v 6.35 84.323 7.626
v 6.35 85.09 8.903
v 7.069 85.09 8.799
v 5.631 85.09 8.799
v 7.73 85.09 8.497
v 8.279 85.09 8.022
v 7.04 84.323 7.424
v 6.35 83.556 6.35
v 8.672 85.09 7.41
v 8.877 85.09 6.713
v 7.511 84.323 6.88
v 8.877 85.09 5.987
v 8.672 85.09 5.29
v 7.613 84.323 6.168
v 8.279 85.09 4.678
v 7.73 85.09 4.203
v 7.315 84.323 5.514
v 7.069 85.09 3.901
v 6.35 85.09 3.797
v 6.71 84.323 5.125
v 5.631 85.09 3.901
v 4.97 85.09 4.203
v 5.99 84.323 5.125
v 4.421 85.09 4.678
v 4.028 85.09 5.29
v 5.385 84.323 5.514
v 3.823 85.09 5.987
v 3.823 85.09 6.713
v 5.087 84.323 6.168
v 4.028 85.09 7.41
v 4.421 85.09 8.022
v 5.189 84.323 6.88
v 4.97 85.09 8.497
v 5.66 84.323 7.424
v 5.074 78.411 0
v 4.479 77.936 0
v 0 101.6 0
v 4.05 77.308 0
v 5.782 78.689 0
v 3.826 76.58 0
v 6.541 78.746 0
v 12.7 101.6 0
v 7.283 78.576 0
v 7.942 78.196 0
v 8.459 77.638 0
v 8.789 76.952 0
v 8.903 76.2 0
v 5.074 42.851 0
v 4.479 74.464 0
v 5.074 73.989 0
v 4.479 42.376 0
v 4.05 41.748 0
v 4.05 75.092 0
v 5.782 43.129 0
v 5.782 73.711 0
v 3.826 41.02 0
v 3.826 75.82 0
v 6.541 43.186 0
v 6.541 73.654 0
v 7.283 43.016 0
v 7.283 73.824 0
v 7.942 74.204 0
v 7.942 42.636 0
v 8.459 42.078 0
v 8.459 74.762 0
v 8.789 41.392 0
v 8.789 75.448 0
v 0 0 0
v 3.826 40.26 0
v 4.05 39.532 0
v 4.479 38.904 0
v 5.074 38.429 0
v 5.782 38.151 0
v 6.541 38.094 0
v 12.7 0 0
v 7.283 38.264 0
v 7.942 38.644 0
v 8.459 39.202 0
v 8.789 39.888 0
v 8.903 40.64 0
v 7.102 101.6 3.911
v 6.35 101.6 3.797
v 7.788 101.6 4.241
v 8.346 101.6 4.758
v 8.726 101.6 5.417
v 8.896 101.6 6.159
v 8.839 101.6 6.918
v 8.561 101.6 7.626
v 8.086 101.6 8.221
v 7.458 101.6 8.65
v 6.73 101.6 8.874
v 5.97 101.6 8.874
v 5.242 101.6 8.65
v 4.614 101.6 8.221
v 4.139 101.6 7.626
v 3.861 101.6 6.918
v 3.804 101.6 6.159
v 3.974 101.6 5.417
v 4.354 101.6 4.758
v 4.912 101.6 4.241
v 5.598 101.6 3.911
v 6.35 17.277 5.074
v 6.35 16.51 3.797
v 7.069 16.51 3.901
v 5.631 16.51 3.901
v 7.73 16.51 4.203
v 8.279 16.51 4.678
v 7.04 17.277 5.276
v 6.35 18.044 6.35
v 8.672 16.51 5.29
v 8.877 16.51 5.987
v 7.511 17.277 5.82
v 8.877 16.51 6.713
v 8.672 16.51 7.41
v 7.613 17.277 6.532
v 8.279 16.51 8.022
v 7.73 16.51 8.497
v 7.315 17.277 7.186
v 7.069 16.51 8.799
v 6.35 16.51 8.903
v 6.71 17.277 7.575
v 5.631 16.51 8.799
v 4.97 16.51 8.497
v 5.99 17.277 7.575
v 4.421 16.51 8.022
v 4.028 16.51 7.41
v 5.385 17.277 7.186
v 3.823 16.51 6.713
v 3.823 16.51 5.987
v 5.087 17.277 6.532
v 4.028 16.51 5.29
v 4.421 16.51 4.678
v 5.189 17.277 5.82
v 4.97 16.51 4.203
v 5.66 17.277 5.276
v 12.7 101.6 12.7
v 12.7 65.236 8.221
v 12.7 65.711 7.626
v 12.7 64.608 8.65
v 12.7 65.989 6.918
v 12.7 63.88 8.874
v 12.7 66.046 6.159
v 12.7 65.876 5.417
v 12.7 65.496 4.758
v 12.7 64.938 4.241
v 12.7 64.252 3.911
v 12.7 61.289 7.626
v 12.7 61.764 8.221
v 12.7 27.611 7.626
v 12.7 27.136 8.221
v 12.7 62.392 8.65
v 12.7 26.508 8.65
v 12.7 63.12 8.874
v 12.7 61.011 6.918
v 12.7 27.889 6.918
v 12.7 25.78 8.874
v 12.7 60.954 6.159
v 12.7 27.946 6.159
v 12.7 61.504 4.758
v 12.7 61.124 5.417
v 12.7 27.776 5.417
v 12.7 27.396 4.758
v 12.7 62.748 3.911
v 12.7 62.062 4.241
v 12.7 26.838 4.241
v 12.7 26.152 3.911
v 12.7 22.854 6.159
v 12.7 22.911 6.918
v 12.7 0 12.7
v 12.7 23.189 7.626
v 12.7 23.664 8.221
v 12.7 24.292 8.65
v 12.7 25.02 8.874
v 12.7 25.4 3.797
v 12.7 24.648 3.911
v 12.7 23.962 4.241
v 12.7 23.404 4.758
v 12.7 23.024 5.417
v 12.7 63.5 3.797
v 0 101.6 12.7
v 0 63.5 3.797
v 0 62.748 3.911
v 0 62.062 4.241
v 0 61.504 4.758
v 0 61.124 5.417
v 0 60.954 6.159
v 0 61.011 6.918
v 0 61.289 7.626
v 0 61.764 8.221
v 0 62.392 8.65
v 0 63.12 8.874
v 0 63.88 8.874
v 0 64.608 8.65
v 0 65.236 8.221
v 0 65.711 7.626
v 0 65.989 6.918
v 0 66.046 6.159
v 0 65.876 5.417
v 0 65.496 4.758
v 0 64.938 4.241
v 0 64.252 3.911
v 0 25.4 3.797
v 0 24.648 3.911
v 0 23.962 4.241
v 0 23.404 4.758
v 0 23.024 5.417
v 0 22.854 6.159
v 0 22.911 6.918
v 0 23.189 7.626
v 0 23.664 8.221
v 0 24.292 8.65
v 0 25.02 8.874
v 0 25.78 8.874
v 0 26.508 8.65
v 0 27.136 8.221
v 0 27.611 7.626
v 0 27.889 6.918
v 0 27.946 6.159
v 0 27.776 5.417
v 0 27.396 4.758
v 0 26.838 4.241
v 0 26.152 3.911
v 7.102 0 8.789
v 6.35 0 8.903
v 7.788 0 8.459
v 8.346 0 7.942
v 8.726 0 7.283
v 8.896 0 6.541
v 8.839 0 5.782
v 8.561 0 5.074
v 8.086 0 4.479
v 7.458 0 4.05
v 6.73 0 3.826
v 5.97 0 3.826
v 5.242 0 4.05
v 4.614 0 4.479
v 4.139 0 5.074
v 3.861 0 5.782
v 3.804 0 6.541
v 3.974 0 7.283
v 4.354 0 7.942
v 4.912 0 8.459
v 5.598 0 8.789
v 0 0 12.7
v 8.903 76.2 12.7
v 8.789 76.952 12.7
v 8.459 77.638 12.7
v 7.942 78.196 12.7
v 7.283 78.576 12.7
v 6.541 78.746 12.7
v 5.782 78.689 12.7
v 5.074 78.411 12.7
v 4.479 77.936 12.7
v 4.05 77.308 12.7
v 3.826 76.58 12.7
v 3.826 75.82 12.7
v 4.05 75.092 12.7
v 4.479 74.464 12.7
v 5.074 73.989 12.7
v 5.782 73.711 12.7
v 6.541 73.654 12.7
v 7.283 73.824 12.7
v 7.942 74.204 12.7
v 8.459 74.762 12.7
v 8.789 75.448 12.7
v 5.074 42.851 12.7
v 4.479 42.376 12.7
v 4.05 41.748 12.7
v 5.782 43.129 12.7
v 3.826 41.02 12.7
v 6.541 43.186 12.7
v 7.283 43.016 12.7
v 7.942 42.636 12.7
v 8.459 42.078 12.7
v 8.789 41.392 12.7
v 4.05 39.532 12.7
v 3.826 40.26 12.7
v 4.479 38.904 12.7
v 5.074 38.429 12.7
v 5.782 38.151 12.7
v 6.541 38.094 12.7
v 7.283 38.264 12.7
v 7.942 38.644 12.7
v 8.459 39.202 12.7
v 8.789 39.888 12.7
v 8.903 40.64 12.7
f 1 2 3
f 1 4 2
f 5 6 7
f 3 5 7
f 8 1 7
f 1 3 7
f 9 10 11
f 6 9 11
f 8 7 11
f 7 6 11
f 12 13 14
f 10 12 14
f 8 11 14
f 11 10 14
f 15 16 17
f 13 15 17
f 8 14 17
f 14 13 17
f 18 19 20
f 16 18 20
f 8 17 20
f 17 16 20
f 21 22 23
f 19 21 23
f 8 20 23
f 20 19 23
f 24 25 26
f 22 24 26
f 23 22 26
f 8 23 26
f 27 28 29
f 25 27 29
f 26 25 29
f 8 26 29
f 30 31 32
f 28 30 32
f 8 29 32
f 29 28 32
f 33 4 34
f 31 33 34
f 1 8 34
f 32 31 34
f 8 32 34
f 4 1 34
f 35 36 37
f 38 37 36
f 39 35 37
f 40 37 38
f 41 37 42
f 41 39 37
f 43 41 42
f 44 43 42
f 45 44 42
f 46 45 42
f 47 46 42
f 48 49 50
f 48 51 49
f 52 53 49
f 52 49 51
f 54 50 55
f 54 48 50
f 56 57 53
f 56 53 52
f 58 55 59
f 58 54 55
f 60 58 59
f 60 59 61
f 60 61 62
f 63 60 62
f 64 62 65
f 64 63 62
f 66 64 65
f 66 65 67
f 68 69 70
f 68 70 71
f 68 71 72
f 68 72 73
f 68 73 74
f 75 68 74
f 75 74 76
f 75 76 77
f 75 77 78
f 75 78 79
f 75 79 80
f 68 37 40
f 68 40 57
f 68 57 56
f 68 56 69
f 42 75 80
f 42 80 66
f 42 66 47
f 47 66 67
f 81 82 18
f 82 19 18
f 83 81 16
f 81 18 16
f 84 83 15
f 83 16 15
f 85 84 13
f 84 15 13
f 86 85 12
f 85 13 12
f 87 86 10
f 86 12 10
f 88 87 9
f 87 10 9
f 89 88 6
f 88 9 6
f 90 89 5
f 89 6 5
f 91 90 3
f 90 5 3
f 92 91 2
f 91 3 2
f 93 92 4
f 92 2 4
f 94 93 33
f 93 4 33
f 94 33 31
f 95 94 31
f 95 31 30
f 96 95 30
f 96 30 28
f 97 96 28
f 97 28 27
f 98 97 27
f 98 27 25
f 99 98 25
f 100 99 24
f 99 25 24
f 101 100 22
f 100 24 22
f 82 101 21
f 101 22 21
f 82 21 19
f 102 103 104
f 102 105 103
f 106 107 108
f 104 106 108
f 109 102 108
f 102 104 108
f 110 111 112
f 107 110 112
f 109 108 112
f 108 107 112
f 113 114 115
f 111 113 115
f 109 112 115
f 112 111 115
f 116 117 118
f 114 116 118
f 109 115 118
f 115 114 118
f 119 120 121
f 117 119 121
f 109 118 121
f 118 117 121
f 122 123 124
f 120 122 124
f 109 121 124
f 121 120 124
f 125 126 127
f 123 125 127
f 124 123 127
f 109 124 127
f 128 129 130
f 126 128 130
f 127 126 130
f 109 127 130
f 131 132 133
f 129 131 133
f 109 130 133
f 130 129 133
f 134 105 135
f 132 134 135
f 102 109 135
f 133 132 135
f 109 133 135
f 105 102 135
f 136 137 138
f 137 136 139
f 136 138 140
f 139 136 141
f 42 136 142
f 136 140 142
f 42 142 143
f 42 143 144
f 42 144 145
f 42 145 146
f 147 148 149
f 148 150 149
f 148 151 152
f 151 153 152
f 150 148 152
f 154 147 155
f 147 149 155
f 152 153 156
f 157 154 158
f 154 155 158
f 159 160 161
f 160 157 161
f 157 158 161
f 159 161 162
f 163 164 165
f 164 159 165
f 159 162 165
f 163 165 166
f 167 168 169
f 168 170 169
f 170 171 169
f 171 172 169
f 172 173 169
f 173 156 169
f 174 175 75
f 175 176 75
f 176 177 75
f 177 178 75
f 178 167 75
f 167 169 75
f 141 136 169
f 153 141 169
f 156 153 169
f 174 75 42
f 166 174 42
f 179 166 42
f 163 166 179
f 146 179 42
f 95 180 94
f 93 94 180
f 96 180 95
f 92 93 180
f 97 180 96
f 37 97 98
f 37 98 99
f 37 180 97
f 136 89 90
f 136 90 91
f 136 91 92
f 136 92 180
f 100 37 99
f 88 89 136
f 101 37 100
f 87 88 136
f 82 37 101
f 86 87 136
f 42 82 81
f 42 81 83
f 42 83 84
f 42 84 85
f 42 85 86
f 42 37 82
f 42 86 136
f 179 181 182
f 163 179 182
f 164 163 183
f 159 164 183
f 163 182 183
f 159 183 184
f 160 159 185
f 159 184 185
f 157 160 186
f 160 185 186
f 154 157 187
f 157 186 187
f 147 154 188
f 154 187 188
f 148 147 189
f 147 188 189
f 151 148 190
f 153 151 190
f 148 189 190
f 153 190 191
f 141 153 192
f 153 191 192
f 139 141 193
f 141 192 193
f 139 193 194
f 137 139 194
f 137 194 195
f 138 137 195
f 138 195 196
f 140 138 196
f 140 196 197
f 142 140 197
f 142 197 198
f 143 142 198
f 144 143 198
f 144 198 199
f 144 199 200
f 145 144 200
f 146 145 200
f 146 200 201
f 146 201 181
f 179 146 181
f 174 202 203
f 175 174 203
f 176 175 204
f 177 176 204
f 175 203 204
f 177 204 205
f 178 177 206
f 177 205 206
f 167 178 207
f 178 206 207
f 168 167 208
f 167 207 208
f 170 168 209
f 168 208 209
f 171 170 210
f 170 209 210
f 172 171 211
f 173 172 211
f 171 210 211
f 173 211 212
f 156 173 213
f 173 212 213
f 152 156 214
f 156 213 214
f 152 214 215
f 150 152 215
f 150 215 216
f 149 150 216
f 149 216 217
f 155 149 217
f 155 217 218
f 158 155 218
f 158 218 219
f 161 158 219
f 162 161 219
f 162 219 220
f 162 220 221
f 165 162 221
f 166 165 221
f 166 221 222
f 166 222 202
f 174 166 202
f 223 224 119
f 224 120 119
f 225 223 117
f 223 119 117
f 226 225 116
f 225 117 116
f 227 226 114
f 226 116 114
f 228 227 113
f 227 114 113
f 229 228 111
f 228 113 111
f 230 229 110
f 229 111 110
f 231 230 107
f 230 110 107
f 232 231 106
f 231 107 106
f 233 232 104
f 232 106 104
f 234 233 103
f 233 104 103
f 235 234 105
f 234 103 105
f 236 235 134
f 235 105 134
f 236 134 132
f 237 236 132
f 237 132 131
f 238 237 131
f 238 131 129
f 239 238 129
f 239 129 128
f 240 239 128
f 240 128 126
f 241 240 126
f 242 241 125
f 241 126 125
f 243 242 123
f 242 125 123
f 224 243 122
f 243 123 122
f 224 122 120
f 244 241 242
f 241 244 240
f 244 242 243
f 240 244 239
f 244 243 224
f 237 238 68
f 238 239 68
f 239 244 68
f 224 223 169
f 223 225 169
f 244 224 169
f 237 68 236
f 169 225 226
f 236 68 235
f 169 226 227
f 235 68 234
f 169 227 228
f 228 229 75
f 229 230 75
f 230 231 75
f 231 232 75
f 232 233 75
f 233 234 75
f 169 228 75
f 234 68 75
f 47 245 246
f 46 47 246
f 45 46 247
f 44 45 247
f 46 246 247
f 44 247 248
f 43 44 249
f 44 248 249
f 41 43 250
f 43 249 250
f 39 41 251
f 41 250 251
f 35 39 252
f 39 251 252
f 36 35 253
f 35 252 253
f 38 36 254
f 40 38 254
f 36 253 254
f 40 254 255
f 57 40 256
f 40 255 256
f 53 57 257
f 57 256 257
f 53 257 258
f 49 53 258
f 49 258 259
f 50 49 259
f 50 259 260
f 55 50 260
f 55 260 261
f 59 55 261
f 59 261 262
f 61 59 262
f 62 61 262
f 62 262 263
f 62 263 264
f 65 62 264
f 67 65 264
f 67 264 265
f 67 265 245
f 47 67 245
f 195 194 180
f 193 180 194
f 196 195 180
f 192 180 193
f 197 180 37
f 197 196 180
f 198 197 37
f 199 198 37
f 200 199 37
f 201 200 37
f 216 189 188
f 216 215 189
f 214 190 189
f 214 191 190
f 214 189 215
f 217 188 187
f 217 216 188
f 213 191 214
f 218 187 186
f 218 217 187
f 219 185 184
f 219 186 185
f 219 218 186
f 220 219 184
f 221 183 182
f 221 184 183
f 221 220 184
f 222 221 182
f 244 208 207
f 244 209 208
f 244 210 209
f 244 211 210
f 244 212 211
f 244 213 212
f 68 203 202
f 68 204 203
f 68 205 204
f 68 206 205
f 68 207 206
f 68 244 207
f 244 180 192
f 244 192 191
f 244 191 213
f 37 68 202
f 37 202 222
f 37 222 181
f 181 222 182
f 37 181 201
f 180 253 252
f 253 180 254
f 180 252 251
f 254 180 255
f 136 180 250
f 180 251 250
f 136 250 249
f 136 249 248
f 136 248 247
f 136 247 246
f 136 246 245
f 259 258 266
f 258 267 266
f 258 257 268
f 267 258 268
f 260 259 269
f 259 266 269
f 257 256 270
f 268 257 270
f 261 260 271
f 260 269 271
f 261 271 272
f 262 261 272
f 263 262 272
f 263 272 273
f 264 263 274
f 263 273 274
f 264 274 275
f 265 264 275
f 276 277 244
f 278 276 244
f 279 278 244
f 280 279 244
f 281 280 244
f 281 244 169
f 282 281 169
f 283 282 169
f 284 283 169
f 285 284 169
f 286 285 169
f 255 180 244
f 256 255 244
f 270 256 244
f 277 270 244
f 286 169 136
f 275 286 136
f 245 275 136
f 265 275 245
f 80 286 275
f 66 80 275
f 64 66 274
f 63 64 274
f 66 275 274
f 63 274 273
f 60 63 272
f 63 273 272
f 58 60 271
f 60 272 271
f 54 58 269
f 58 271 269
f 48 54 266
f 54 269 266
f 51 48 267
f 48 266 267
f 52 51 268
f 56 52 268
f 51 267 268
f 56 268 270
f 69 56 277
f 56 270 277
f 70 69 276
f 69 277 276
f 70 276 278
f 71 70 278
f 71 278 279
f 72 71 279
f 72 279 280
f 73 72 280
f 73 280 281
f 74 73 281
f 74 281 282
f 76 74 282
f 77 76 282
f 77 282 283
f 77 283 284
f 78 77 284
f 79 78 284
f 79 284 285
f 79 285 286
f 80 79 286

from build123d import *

# Parameters (mm, degrees)
SKETCH1_W                             = 12.7
SKETCH1_H                             = 12.7
BOSS_EXTRUDE1_DEPTH                   = 101.6
F_1_4_20_TAPPED_HOLE1_D               = 5.1054
F_1_4_20_TAPPED_HOLE1_DEPTH           = 16.51
F_1_4_20_TAPPED_HOLE1_TIP             = 1.533816902
F_1_4_20_TAPPED_HOLE1_ON_FACE_2_D     = 5.1054
F_1_4_20_TAPPED_HOLE1_ON_FACE_2_DEPTH = 16.51
F_1_4_20_TAPPED_HOLE1_ON_FACE_2_TIP   = 1.533816902
F_1_4_20_TAPPED_HOLE2_D               = 5.1054
F_1_4_20_TAPPED_HOLE2_DEPTH           = 16.51
F_1_4_20_TAPPED_HOLE2_TIP             = 1.533816902
F_1_4_20_TAPPED_HOLE3_D               = 5.1054
F_1_4_20_TAPPED_HOLE3_DEPTH           = 16.51
F_1_4_20_TAPPED_HOLE3_TIP             = 1.533816902


with BuildPart() as part:
    # Sketch1 → Boss-Extrude1 (new body)
    with BuildSketch(Plane(origin=(0, 0, 0), x_dir=(1, 0, 0), z_dir=(0, 1, 0))):
        with Locations((6.35, -6.35)):
            Rectangle(SKETCH1_W, SKETCH1_H)
    extrude(amount=BOSS_EXTRUDE1_DEPTH)

    # 1/4-20 Tapped Hole1
    with Locations(Plane(origin=(6.35, 0, 6.35), x_dir=(0, 0, -1), z_dir=(0, -1, 0))):
        with Locations((0, 0)):
            Hole(F_1_4_20_TAPPED_HOLE1_D / 2, depth=F_1_4_20_TAPPED_HOLE1_DEPTH)
            with Locations((0, 0, -(F_1_4_20_TAPPED_HOLE1_DEPTH + F_1_4_20_TAPPED_HOLE1_TIP / 2))):  # 118° drill point
                Cone(0, F_1_4_20_TAPPED_HOLE1_D / 2, F_1_4_20_TAPPED_HOLE1_TIP, mode=Mode.SUBTRACT)

    # 1/4-20 Tapped Hole1 on face 2
    with Locations(Plane(origin=(6.35, 101.6, 6.35), x_dir=(0, 0, 1), z_dir=(0, 1, 0))):
        with Locations((0, 0)):
            Hole(F_1_4_20_TAPPED_HOLE1_ON_FACE_2_D / 2, depth=F_1_4_20_TAPPED_HOLE1_ON_FACE_2_DEPTH)
            with Locations((0, 0, -(F_1_4_20_TAPPED_HOLE1_ON_FACE_2_DEPTH + F_1_4_20_TAPPED_HOLE1_ON_FACE_2_TIP / 2))):  # 118° drill point
                Cone(0, F_1_4_20_TAPPED_HOLE1_ON_FACE_2_D / 2, F_1_4_20_TAPPED_HOLE1_ON_FACE_2_TIP, mode=Mode.SUBTRACT)

    # 1/4-20 Tapped Hole2
    with Locations(Plane(origin=(6.35, 76.2, 0), x_dir=(-1, 0, 0), z_dir=(0, 0, -1))):
        with Locations((0, 0), (0, -35.56)):
            Hole(F_1_4_20_TAPPED_HOLE2_D / 2, depth=F_1_4_20_TAPPED_HOLE2_DEPTH)
            with Locations((0, 0, -(F_1_4_20_TAPPED_HOLE2_DEPTH + F_1_4_20_TAPPED_HOLE2_TIP / 2))):  # 118° drill point
                Cone(0, F_1_4_20_TAPPED_HOLE2_D / 2, F_1_4_20_TAPPED_HOLE2_TIP, mode=Mode.SUBTRACT)

    # 1/4-20 Tapped Hole3
    with Locations(Plane(origin=(12.7, 25.4, 6.35), x_dir=(0, 0, 1), z_dir=(1, 0, 0))):
        with Locations((0, 0), (0, -38.1)):
            Hole(F_1_4_20_TAPPED_HOLE3_D / 2, depth=F_1_4_20_TAPPED_HOLE3_DEPTH)
            with Locations((0, 0, -(F_1_4_20_TAPPED_HOLE3_DEPTH + F_1_4_20_TAPPED_HOLE3_TIP / 2))):  # 118° drill point
                Cone(0, F_1_4_20_TAPPED_HOLE3_D / 2, F_1_4_20_TAPPED_HOLE3_TIP, mode=Mode.SUBTRACT)


solid = part.part
